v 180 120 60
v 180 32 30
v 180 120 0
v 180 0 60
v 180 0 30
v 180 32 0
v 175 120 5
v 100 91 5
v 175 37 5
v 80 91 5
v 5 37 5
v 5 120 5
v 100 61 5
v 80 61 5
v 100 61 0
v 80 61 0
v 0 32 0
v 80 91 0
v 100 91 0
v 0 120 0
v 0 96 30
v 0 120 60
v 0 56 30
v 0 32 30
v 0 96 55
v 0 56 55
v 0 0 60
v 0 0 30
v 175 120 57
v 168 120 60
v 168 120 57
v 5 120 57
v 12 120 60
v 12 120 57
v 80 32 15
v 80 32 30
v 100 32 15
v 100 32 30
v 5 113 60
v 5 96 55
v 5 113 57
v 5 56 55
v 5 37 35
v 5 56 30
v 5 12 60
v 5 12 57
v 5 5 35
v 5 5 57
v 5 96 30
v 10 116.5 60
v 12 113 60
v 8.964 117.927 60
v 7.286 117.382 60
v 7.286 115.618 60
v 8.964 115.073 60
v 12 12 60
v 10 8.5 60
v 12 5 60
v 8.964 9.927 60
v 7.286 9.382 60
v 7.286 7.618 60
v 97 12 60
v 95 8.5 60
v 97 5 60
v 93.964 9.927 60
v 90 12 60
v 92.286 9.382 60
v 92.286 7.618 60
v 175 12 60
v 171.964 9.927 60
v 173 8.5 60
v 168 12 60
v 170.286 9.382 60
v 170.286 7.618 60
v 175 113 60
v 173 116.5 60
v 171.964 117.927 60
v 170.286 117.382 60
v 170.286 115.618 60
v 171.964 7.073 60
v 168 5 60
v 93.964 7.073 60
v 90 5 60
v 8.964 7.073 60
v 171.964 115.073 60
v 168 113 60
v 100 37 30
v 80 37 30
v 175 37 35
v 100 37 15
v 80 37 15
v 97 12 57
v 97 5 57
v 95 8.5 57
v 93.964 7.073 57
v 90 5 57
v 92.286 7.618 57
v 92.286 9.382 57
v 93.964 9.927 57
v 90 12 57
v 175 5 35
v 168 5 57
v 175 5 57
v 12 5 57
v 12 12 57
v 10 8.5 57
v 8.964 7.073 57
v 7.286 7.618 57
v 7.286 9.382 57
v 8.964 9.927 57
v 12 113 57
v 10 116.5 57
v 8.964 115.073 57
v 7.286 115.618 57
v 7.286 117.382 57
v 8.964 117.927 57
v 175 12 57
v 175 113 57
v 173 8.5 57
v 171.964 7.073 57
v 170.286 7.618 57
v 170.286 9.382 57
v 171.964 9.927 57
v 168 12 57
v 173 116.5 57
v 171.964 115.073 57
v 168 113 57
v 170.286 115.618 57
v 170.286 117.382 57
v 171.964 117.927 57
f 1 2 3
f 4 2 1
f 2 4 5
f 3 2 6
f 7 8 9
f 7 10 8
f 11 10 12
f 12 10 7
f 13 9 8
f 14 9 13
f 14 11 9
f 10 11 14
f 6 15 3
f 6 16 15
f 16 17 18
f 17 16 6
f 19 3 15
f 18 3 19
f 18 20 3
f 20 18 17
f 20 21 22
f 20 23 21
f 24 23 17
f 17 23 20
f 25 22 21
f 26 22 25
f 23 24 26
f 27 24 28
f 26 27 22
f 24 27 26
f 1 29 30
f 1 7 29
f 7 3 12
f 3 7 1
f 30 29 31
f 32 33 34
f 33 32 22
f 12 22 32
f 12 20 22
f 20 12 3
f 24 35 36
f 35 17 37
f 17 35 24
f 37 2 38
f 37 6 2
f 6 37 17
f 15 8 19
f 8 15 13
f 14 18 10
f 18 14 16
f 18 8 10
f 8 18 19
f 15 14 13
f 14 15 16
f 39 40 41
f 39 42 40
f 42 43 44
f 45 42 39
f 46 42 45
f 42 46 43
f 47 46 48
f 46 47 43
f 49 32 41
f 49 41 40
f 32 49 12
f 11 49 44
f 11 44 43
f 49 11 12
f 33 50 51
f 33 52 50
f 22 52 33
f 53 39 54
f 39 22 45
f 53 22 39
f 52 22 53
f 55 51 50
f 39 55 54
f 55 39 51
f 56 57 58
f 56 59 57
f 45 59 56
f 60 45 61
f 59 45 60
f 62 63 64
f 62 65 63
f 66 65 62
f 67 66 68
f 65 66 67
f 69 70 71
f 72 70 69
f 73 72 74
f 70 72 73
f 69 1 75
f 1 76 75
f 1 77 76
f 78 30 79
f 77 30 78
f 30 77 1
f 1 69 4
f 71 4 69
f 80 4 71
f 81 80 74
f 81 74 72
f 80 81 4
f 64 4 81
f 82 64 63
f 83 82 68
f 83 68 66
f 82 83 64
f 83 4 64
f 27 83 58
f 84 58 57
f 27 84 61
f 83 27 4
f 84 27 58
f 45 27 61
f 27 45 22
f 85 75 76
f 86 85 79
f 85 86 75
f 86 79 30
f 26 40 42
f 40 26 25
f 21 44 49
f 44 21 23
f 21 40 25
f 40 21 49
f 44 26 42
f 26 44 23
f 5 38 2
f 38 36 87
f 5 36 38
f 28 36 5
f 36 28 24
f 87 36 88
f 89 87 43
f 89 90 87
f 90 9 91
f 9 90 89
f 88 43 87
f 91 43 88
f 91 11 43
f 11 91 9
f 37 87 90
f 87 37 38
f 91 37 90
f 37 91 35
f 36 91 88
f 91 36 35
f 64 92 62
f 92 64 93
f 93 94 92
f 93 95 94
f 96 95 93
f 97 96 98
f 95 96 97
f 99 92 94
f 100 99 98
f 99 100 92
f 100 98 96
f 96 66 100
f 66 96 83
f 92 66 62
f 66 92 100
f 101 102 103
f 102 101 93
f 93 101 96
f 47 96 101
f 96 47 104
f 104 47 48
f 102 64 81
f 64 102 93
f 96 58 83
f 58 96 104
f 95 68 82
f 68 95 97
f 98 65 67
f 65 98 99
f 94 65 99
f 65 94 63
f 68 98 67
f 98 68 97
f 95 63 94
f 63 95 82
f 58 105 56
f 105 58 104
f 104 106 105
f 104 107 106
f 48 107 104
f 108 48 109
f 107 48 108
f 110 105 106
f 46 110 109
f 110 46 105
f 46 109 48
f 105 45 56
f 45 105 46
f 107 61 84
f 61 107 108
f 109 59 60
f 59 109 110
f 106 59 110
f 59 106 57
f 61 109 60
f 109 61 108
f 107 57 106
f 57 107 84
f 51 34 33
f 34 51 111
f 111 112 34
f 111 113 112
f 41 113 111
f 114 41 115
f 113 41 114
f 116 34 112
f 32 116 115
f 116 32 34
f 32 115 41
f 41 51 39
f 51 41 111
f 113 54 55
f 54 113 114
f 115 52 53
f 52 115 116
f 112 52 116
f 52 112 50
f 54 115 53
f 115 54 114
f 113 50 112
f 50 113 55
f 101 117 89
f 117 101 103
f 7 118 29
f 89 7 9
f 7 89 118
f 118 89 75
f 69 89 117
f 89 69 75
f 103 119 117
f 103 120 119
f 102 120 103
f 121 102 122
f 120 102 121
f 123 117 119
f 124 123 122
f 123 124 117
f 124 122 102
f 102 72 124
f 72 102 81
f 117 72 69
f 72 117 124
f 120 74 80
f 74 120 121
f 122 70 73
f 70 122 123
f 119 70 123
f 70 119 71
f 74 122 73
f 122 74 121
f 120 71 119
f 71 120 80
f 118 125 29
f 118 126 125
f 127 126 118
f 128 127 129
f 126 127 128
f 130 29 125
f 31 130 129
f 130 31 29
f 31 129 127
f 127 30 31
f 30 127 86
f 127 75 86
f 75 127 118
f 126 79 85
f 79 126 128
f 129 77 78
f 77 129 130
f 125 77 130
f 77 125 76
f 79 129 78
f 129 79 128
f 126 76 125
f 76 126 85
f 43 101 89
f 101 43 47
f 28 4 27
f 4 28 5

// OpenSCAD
base_z = 60;
base_x = 180;
base_y = 120;

shelf_z = 30;
shelf_x = base_x;
shelf_y = 32;

wall_thickness = 5;

module base_screw_plate(plate_size=7, screw_size=3, plate_thickness=3, x,y){
    screw_plate_size = 7;
    screw_plate_thickness = 3;
    translate([x,y,base_z-screw_plate_thickness]) {
        difference(){
            color("blue")
            //base_screw_hole 
            cube([screw_plate_size, screw_plate_size , screw_plate_thickness]);
            color("red")
            translate([screw_plate_size/2, screw_plate_size/2, 0-1]){
                cylinder (h = screw_plate_thickness+2, r=1.5);
            }
        }   
    }
}

union(){
translate([0,shelf_y,0]) {
    //base cube
    difference(){
        cube([base_x,base_y-shelf_y,wall_thickness]);   
        cable_opening_x = 20;
        cable_opening_y = 30;
        //cable opening in base cube
        translate([base_x/2-cable_opening_x/2, (base_y-shelf_y)/2 - cable_opening_y/2,0-1]){
            cube([cable_opening_x,cable_opening_y,wall_thickness+2]); 
        }
    } 
}


translate([0,shelf_y,0]) {
    //left wall
    difference(){
        color("red")
        cube([wall_thickness,base_y-shelf_y,base_z]);     
        cable_opening_y = 40;
        cable_opening_z = 25;
        //cable opening in left wall
        translate([-1, (base_y-cable_opening_y-shelf_y)/2, base_z - cable_opening_z - wall_thickness]){
            cube([wall_thickness+2,cable_opening_y,cable_opening_z]); 
        }
    }    
}

translate([base_x-wall_thickness,shelf_y,0]) {
    //right wall
    cube([wall_thickness,base_y-shelf_y,base_z]);        
}

translate([0,0,shelf_z]) {
    color("green")
    //shelf base    
    cube([shelf_x,shelf_y+wall_thickness,wall_thickness]);       
}

translate([0,shelf_y,0]) {
    //shelf front wall upper
    difference(){
        color("green")
        cube([shelf_x,wall_thickness,shelf_z]);     
        cable_opening_x = 20;
        cable_opening_z = 15;
        //cable opening in front upper wall
        translate([shelf_x/2-cable_opening_x/2, -1,shelf_z - cable_opening_z]){
            cube([cable_opening_x,wall_thickness+2,cable_opening_z]); 
        }
    }
}

translate([0,0,shelf_z]) {
    color("green")
    //shelf front wall lower
    cube([shelf_x,wall_thickness,shelf_z]);       
}

translate([shelf_x- wall_thickness,0,shelf_z]) {
    //shelf right wall
    cube([wall_thickness,shelf_y,base_z-shelf_z]);        
}

translate([0,0,shelf_z]) {
    color("red")
    //shelf left wall
    cube([wall_thickness,shelf_y,base_z-shelf_z]);        
}



base_screw_plate(x = base_x/2, y = wall_thickness);
base_screw_plate(x = wall_thickness, y = wall_thickness);
base_screw_plate(x = wall_thickness, y = base_y-7);
base_screw_plate(x = base_x - 12, y = wall_thickness);
base_screw_plate(x = base_x - 12, y = base_y-7);

}
